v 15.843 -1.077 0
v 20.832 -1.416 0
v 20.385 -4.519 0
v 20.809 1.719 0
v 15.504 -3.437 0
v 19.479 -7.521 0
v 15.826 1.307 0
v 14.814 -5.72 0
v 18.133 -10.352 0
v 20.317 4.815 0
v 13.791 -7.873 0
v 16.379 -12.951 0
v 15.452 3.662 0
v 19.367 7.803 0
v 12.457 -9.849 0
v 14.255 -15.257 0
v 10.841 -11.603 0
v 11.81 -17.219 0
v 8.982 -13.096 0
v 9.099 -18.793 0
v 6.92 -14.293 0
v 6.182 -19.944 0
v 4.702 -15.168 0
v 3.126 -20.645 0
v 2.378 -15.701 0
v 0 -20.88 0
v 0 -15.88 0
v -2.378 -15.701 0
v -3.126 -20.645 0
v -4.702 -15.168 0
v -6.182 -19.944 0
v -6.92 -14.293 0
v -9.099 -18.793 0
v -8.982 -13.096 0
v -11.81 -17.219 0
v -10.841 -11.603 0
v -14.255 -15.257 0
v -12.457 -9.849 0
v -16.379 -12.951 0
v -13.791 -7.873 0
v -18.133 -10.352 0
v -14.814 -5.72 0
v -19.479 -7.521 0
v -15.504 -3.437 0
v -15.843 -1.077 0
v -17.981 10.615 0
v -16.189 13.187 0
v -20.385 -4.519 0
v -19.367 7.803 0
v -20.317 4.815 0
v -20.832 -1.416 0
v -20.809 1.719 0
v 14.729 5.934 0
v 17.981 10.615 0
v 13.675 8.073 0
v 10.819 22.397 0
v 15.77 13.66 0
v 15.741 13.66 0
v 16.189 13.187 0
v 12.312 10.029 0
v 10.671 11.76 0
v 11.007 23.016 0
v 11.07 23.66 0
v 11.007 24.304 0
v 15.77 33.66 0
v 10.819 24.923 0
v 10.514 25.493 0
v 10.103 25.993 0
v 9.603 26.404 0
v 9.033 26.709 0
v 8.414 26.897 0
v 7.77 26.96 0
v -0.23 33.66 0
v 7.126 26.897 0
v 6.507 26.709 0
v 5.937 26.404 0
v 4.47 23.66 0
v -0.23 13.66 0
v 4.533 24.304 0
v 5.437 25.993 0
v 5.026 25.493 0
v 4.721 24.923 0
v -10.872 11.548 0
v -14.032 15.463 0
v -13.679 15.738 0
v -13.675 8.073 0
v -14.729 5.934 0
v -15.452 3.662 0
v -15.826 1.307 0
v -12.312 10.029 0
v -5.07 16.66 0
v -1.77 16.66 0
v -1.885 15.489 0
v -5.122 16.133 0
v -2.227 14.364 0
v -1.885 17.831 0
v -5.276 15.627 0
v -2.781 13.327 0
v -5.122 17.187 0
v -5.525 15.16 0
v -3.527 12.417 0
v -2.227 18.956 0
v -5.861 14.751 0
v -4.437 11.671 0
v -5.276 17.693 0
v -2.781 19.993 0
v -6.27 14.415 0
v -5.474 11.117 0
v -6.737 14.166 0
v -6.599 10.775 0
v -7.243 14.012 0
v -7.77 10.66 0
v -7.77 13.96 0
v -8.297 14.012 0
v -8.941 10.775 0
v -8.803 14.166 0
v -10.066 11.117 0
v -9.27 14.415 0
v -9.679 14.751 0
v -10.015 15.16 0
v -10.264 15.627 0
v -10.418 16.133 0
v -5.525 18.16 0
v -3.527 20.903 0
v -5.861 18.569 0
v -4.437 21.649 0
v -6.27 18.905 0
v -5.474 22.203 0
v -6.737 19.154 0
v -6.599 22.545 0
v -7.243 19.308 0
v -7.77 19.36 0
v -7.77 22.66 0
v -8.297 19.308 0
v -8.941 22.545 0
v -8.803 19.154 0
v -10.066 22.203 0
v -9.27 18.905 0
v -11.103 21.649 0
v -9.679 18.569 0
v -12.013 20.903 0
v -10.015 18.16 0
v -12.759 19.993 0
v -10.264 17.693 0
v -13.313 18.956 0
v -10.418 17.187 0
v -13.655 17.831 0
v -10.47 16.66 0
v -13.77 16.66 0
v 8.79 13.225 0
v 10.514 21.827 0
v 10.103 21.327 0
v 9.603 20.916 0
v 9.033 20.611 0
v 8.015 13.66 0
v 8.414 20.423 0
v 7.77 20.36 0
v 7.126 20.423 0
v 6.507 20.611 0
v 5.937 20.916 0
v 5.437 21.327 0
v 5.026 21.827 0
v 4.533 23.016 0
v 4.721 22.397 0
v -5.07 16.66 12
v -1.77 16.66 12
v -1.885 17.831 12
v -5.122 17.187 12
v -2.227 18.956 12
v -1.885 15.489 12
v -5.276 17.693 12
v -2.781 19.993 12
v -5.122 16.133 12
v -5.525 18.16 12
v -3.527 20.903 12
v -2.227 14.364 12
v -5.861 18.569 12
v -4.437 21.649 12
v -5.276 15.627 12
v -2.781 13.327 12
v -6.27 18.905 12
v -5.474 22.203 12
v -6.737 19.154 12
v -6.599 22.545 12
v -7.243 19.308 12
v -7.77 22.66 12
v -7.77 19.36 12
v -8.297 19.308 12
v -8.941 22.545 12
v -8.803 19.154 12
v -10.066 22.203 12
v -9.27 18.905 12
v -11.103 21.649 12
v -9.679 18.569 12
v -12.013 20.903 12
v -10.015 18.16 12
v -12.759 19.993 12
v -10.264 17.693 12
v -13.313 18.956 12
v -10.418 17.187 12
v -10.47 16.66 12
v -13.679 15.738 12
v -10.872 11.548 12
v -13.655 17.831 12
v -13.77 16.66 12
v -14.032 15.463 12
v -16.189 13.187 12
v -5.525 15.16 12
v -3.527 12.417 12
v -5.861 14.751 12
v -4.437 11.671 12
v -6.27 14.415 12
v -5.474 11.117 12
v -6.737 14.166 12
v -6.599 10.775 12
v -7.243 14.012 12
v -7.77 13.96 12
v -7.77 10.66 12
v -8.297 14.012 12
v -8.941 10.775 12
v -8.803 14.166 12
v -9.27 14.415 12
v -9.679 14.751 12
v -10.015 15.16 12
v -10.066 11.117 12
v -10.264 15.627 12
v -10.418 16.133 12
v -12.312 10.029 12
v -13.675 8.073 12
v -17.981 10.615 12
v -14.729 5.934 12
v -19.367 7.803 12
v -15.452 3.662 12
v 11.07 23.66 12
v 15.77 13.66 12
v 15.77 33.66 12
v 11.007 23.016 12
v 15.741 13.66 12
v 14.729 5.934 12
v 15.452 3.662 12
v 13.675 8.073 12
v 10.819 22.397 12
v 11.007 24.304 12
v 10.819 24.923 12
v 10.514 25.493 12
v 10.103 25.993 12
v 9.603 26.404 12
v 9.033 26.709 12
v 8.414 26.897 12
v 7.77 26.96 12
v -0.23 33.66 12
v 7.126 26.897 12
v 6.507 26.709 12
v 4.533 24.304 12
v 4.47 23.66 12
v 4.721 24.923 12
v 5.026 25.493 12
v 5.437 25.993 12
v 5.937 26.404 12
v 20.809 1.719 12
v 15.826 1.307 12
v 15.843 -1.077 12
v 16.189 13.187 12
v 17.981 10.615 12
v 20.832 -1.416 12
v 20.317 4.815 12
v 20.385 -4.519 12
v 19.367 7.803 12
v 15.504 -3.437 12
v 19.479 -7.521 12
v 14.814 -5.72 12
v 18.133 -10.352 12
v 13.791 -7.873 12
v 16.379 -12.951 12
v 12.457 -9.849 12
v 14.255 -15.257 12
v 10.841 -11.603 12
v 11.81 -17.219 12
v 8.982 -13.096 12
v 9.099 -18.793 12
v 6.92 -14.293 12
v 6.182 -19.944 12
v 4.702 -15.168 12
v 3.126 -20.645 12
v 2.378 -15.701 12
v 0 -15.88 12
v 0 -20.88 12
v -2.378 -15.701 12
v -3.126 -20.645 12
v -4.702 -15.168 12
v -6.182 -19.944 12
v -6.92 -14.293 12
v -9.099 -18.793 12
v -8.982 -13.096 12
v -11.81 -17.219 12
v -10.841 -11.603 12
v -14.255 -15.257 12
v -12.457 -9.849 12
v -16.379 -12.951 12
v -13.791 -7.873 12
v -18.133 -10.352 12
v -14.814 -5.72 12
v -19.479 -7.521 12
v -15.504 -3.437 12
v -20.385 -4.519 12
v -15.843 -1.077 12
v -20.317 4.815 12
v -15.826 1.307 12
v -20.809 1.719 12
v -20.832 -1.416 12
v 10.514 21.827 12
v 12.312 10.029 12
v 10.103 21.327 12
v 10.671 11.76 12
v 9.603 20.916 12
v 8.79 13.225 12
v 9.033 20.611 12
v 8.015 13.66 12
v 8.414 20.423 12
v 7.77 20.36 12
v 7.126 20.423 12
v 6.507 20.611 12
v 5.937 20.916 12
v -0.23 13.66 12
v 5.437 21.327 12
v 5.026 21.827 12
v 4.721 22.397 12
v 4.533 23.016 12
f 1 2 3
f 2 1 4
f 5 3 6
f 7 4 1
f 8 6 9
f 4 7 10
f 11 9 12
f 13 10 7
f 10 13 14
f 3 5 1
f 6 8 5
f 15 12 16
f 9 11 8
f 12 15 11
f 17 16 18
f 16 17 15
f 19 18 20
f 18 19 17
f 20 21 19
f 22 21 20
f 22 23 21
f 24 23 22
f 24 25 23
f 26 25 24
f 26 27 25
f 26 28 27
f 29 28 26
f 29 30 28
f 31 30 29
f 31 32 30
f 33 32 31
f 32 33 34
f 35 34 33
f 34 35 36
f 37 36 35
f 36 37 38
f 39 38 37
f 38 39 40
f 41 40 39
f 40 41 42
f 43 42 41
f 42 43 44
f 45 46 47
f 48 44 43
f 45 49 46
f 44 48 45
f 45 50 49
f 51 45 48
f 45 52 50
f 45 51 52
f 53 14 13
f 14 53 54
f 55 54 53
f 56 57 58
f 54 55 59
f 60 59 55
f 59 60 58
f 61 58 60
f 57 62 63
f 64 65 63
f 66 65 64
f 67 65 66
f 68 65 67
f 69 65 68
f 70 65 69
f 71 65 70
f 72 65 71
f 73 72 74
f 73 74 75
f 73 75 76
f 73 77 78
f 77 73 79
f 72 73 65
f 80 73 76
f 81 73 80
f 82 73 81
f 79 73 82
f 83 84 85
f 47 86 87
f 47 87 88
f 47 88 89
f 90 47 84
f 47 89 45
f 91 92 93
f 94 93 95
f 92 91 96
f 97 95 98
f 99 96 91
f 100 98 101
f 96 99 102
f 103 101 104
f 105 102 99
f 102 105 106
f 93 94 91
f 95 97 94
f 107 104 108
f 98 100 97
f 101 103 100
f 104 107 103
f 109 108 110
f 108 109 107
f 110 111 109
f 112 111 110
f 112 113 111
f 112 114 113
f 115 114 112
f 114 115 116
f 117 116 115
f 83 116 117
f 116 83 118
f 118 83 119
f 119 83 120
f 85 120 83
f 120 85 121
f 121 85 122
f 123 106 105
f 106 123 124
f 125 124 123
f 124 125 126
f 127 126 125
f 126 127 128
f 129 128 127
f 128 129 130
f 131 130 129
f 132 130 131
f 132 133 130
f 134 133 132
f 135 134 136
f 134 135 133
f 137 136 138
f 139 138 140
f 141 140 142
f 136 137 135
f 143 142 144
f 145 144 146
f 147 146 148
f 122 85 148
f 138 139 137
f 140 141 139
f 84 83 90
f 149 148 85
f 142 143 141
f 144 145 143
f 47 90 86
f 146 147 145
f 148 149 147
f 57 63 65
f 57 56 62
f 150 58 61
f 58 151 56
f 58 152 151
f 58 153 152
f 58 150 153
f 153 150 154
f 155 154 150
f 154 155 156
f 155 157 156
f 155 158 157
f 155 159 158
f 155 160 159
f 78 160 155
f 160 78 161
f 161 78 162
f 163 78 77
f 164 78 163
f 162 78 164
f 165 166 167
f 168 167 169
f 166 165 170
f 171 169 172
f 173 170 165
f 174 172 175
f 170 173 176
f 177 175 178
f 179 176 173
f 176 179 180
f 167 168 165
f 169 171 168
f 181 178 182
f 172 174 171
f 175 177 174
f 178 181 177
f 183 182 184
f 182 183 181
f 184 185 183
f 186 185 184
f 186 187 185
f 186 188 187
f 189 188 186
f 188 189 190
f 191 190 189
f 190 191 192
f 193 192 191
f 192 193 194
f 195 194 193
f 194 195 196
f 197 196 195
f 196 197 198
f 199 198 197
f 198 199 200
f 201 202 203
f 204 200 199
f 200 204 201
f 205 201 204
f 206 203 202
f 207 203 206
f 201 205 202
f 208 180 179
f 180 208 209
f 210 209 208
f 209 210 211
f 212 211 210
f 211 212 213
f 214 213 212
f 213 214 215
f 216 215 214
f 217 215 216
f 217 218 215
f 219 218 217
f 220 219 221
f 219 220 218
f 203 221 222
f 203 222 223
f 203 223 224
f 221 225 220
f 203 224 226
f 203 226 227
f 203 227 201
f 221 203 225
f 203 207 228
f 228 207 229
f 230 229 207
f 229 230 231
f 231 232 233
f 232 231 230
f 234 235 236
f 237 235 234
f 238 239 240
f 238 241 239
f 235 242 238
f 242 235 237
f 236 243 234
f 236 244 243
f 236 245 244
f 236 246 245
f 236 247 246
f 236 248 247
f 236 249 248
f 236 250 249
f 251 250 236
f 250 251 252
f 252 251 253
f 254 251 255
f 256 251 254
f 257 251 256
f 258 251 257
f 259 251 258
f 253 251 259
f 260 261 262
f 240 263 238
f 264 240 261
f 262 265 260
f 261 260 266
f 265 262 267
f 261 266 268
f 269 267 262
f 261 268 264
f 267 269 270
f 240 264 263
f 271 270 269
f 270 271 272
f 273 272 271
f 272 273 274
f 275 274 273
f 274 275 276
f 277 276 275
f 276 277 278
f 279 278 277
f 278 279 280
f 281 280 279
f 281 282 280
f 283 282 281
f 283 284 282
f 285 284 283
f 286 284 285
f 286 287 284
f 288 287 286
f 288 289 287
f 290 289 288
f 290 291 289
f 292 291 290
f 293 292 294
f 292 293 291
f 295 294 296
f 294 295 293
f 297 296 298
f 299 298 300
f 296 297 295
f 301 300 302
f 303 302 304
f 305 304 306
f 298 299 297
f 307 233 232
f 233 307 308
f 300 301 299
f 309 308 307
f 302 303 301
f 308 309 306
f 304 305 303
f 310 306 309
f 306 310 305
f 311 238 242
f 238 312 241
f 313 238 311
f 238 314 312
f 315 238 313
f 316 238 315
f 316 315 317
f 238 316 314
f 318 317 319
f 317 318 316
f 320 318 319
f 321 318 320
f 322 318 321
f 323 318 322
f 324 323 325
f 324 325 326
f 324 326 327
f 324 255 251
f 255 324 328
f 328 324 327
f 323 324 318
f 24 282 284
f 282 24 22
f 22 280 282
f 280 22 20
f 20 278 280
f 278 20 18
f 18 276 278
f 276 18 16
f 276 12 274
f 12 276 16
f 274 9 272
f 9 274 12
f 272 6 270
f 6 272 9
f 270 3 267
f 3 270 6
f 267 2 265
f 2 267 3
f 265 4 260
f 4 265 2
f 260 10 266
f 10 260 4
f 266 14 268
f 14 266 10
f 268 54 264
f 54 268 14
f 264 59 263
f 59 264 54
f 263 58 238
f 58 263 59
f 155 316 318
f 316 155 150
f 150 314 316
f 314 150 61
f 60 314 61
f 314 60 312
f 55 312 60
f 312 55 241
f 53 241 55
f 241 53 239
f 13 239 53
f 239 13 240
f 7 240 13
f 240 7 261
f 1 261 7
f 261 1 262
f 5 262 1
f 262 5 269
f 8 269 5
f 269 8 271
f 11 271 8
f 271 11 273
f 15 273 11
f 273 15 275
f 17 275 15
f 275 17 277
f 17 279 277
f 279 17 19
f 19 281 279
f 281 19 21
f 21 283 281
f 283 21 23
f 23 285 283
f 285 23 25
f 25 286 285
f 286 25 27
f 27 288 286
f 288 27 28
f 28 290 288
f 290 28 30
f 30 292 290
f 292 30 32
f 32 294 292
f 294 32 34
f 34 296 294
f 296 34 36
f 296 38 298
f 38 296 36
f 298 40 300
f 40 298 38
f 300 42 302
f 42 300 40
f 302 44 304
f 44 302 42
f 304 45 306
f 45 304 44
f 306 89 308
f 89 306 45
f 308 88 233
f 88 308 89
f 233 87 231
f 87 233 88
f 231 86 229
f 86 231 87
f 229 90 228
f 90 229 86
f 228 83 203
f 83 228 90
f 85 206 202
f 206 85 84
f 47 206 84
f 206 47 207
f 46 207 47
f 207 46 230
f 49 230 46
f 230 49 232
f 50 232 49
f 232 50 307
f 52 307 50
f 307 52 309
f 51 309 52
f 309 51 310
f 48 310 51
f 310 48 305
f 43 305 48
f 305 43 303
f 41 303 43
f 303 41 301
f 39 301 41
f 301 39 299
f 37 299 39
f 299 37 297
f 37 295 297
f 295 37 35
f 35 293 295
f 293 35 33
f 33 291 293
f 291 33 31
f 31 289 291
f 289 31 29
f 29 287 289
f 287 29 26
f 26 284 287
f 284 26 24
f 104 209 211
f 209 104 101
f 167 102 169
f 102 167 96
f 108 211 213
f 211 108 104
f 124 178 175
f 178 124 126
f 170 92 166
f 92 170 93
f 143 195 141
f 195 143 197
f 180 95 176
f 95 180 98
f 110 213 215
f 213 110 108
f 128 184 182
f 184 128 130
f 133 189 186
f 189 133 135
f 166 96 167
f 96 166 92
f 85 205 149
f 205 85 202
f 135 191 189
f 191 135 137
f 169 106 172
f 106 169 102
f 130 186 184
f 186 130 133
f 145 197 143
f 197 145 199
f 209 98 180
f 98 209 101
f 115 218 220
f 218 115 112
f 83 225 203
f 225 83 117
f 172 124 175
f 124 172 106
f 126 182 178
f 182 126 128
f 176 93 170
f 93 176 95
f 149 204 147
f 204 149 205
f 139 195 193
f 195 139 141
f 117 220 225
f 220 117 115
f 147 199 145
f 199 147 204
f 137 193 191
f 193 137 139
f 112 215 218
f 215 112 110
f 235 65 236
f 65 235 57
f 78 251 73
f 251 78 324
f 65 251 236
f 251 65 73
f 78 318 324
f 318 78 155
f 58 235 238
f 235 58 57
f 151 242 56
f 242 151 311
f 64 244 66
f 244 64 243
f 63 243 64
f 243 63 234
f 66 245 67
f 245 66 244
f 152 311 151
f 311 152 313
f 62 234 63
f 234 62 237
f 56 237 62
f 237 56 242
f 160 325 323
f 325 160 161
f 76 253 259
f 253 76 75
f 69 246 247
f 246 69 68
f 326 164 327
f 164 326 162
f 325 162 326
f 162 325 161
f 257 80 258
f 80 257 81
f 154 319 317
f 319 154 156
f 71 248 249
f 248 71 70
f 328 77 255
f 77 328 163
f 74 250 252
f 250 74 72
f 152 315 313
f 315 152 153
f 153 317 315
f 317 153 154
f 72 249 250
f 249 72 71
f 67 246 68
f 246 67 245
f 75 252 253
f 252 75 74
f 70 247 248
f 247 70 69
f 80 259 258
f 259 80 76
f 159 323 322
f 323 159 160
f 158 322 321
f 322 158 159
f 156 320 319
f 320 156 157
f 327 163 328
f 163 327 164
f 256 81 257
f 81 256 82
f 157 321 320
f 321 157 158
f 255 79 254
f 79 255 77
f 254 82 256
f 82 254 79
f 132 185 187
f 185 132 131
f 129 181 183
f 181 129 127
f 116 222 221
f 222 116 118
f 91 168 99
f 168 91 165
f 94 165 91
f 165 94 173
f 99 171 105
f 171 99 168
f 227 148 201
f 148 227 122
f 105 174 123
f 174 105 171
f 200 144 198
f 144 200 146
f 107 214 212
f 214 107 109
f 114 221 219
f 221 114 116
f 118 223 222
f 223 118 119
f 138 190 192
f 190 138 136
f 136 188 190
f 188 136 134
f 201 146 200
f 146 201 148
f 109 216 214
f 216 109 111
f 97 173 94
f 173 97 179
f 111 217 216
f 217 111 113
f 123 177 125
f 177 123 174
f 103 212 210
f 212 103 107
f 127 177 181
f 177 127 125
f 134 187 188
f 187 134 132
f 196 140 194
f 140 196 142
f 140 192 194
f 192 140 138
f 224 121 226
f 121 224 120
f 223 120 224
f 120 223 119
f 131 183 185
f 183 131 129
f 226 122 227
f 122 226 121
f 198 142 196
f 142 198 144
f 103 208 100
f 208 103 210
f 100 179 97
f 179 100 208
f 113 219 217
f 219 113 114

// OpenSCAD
$fn = 32;

// ----------------------------------------------------------------------
// Pipe clamp: 41.76 mm ring, 5 mm wall, 12 mm wide
// ----------------------------------------------------------------------

// --- parameters (mm) ---
outer_r = 20.88;          // clamp outside radius
inner_r = 15.88;          // pipe bore radius
band = 5;                 // band thickness
clamp_w = 12;             // clamp width
opening = 50;             // opening angle between the ends
lug_w = 16;               // lug width
lug_len = 20;             // lug length
bolt_d = 6.6;             // bolt hole
knuckle_d = 12;           // hinge knuckle diameter
pin_d = 5.4;              // hinge pin hole

clamp_profile = [[-8.824, 18.924], [-11.558, 17.389], [-14.032, 15.463], [-16.189, 13.187], [-17.981, 10.615], [-19.367, 7.803], [-20.317, 4.815], [-20.809, 1.719], [-20.832, -1.416], [-20.385, -4.519], [-19.479, -7.521], [-18.133, -10.352], [-16.379, -12.951], [-14.255, -15.257], [-11.81, -17.219], [-9.099, -18.793], [-6.182, -19.944], [-3.126, -20.645], [0, -20.88], [3.126, -20.645], [6.182, -19.944], [9.099, -18.793], [11.81, -17.219], [14.255, -15.257], [16.379, -12.951], [18.133, -10.352], [19.479, -7.521], [20.385, -4.519], [20.832, -1.416], [20.809, 1.719], [20.317, 4.815], [19.367, 7.803], [17.981, 10.615], [16.189, 13.187], [14.032, 15.463], [11.558, 17.389], [8.824, 18.924], [6.711, 14.392], [8.79, 13.225], [10.671, 11.76], [12.312, 10.029], [13.675, 8.073], [14.729, 5.934], [15.452, 3.662], [15.826, 1.307], [15.843, -1.077], [15.504, -3.437], [14.814, -5.72], [13.791, -7.873], [12.457, -9.849], [10.841, -11.603], [8.982, -13.096], [6.92, -14.293], [4.702, -15.168], [2.378, -15.701], [0, -15.88], [-2.378, -15.701], [-4.702, -15.168], [-6.92, -14.293], [-8.982, -13.096], [-10.841, -11.603], [-12.457, -9.849], [-13.791, -7.873], [-14.814, -5.72], [-15.504, -3.437], [-15.843, -1.077], [-15.826, 1.307], [-15.452, 3.662], [-14.729, 5.934], [-13.675, 8.073], [-12.312, 10.029], [-10.671, 11.76], [-8.79, 13.225], [-6.711, 14.392]];

difference() {
  union() {
    linear_extrude(height = clamp_w) polygon(clamp_profile);
    /* hinge knuckle, sunk 2 mm into the band end */
    translate([-7.77, 16.66, 0]) cylinder(h = clamp_w, d = knuckle_d);
    /* bolt lug on the other end */
    translate([-0.23, 13.66, 0]) cube([lug_w, 20, clamp_w]);
  }
  translate([7.77, 23.66, -2.5]) cylinder(h = clamp_w + 5, d = bolt_d);
  translate([-7.77, 16.66, -2.5]) cylinder(h = clamp_w + 5, d = pin_d);
}
